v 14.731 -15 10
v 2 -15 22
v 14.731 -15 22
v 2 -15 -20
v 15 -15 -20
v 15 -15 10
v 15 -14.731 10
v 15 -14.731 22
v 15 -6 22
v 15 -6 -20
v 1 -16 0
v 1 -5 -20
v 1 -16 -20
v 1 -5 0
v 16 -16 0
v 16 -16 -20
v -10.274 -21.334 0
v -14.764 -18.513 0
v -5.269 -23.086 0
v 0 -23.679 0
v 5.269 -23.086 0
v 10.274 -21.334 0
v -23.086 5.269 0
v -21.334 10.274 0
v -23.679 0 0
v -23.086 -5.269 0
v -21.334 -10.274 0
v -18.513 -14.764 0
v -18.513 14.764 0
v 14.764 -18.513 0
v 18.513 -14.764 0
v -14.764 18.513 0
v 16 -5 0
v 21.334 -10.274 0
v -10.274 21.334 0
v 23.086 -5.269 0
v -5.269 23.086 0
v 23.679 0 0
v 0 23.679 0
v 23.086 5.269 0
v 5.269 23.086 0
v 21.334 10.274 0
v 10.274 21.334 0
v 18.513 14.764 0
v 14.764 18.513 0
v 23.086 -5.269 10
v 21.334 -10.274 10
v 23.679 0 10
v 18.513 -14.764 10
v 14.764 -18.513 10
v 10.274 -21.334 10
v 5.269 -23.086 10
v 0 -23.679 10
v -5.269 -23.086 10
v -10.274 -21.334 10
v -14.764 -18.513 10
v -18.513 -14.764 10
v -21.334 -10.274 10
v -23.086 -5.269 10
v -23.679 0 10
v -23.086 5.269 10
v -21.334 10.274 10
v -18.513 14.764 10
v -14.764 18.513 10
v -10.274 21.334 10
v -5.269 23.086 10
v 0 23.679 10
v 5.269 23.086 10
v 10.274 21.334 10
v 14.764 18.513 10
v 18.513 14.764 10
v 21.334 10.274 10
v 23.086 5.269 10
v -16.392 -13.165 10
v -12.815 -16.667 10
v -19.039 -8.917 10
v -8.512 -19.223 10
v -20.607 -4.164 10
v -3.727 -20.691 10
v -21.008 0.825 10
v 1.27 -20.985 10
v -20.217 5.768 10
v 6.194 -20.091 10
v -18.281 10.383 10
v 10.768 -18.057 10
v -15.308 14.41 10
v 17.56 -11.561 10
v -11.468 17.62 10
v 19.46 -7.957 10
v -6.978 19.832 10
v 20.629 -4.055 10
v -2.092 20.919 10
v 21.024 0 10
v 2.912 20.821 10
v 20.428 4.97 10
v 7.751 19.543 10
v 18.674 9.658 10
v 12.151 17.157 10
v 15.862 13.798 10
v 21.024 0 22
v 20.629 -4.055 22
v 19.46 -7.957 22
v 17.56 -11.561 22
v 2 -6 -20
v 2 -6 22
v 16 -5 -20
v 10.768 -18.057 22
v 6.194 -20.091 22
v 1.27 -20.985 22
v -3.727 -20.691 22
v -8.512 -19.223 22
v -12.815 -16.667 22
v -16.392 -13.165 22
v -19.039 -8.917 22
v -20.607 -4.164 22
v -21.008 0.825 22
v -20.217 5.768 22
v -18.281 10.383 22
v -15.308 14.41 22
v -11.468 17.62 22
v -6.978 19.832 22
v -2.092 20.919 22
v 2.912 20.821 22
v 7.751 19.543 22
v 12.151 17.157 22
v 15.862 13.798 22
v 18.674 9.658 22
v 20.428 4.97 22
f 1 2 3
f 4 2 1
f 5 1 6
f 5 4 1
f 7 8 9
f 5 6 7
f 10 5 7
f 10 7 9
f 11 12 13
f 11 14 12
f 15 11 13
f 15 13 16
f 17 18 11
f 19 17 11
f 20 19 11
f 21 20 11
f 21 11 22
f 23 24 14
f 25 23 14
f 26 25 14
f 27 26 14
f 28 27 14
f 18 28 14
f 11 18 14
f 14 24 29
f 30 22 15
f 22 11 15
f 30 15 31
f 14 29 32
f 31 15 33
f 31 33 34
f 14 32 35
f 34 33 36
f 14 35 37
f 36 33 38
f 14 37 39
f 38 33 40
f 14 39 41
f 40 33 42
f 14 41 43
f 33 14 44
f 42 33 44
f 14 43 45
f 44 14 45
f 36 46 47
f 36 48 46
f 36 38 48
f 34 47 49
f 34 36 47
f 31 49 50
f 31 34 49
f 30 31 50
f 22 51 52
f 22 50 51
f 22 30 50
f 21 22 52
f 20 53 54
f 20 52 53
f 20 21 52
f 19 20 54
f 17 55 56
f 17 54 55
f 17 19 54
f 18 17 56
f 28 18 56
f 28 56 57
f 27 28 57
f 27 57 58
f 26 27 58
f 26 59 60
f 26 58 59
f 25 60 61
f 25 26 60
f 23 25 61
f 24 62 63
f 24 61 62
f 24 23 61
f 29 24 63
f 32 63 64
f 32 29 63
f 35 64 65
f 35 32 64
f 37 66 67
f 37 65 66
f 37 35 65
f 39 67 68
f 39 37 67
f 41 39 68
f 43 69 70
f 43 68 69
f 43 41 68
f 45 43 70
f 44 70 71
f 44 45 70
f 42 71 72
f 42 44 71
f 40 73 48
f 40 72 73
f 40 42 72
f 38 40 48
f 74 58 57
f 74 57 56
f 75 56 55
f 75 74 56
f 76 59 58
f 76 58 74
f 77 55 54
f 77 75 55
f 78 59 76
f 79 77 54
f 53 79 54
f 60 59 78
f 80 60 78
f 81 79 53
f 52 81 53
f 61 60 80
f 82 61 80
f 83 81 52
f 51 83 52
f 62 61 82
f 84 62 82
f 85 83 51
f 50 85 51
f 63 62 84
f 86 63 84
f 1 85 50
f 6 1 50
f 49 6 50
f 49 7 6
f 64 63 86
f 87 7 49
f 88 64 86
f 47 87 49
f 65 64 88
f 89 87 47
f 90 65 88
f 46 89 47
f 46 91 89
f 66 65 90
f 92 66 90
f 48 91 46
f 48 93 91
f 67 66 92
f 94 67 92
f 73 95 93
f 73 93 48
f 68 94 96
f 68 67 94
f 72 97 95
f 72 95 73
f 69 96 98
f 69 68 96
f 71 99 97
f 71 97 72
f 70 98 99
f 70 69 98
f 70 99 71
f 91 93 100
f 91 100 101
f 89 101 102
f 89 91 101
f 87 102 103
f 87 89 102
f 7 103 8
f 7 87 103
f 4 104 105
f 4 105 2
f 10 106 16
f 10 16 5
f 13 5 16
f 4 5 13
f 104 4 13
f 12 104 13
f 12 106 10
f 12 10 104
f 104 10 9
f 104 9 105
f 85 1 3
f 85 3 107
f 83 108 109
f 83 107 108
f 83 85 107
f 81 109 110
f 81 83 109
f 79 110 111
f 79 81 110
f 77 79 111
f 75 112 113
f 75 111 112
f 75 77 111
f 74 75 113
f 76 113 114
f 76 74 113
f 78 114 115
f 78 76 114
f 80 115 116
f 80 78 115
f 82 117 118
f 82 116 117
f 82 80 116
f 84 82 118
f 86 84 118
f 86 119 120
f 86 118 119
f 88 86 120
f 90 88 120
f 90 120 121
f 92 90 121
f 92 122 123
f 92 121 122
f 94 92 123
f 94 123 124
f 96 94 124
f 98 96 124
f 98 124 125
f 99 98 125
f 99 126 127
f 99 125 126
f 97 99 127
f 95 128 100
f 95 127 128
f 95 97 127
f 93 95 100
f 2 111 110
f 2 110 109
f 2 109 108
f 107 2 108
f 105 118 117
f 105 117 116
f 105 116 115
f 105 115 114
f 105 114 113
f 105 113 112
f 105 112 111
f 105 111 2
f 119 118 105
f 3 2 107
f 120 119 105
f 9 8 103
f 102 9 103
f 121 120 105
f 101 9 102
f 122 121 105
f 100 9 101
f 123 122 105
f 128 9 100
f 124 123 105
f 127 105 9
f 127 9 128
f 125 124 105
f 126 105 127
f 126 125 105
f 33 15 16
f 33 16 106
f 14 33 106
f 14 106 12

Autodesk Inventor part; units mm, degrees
ref_plane "YZ Plane" through (0, 0, 0) normal (1, 0, 0) x (0, 1, 0)
ref_plane "XZ Plane" through (0, 0, 0) normal (0, 1, 0) x (-1, 0, 0)
ref_plane "XY Plane" through (0, 0, 0) normal (0, 0, 1) x (1, 0, 0)
sketch "Sketch1" plane through (0, 0, 0) normal (0, 0, 1) x (1, 0, 0)
  circle A0 centre (0, 0) radius 23.6793
extrude "Extrusion1" add sketch "Sketch1" along normal blind 10
sketch "Sketch2" plane through (0, 0, 10) normal (0, 0, 1) x (1, 0, 0)
  circle A0 centre (0, 0) radius 21.0238
extrude "Extrusion2" add sketch "Sketch2" along normal blind 12
sketch "Sketch3" plane through (0, 0, 0) normal (0, 0, -1) x (-1, 0, 0)
  line L0 (-16, -5) -> (-1, -5)
  line L1 (-1, -5) -> (-1, -16)
  line L2 (-1, -16) -> (-16, -16)
  line L3 (-16, -16) -> (-16, -5)
  point P0 (0, 0)
extrude "Extrusion3" add sketch "Sketch3" along normal blind 20
sketch "Sketch4" plane through (0, 0, -20) normal (0, 0, -1) x (-1, 0, 0)
  line L0 (-15, -6) -> (-2, -6)
  line L1 (-2, -6) -> (-2, -15)
  line L2 (-2, -15) -> (-15, -15)
  line L3 (-15, -15) -> (-15, -6)
  point P0 (0, 0)
extrude "Extrusion4" cut sketch "Sketch4" against normal through all
sketch "Sketch5" plane through (0, 0, -20) normal (0, 0, -1) x (-1, 0, 0)
  point P0 (0, 0)
properties part number "lid"
